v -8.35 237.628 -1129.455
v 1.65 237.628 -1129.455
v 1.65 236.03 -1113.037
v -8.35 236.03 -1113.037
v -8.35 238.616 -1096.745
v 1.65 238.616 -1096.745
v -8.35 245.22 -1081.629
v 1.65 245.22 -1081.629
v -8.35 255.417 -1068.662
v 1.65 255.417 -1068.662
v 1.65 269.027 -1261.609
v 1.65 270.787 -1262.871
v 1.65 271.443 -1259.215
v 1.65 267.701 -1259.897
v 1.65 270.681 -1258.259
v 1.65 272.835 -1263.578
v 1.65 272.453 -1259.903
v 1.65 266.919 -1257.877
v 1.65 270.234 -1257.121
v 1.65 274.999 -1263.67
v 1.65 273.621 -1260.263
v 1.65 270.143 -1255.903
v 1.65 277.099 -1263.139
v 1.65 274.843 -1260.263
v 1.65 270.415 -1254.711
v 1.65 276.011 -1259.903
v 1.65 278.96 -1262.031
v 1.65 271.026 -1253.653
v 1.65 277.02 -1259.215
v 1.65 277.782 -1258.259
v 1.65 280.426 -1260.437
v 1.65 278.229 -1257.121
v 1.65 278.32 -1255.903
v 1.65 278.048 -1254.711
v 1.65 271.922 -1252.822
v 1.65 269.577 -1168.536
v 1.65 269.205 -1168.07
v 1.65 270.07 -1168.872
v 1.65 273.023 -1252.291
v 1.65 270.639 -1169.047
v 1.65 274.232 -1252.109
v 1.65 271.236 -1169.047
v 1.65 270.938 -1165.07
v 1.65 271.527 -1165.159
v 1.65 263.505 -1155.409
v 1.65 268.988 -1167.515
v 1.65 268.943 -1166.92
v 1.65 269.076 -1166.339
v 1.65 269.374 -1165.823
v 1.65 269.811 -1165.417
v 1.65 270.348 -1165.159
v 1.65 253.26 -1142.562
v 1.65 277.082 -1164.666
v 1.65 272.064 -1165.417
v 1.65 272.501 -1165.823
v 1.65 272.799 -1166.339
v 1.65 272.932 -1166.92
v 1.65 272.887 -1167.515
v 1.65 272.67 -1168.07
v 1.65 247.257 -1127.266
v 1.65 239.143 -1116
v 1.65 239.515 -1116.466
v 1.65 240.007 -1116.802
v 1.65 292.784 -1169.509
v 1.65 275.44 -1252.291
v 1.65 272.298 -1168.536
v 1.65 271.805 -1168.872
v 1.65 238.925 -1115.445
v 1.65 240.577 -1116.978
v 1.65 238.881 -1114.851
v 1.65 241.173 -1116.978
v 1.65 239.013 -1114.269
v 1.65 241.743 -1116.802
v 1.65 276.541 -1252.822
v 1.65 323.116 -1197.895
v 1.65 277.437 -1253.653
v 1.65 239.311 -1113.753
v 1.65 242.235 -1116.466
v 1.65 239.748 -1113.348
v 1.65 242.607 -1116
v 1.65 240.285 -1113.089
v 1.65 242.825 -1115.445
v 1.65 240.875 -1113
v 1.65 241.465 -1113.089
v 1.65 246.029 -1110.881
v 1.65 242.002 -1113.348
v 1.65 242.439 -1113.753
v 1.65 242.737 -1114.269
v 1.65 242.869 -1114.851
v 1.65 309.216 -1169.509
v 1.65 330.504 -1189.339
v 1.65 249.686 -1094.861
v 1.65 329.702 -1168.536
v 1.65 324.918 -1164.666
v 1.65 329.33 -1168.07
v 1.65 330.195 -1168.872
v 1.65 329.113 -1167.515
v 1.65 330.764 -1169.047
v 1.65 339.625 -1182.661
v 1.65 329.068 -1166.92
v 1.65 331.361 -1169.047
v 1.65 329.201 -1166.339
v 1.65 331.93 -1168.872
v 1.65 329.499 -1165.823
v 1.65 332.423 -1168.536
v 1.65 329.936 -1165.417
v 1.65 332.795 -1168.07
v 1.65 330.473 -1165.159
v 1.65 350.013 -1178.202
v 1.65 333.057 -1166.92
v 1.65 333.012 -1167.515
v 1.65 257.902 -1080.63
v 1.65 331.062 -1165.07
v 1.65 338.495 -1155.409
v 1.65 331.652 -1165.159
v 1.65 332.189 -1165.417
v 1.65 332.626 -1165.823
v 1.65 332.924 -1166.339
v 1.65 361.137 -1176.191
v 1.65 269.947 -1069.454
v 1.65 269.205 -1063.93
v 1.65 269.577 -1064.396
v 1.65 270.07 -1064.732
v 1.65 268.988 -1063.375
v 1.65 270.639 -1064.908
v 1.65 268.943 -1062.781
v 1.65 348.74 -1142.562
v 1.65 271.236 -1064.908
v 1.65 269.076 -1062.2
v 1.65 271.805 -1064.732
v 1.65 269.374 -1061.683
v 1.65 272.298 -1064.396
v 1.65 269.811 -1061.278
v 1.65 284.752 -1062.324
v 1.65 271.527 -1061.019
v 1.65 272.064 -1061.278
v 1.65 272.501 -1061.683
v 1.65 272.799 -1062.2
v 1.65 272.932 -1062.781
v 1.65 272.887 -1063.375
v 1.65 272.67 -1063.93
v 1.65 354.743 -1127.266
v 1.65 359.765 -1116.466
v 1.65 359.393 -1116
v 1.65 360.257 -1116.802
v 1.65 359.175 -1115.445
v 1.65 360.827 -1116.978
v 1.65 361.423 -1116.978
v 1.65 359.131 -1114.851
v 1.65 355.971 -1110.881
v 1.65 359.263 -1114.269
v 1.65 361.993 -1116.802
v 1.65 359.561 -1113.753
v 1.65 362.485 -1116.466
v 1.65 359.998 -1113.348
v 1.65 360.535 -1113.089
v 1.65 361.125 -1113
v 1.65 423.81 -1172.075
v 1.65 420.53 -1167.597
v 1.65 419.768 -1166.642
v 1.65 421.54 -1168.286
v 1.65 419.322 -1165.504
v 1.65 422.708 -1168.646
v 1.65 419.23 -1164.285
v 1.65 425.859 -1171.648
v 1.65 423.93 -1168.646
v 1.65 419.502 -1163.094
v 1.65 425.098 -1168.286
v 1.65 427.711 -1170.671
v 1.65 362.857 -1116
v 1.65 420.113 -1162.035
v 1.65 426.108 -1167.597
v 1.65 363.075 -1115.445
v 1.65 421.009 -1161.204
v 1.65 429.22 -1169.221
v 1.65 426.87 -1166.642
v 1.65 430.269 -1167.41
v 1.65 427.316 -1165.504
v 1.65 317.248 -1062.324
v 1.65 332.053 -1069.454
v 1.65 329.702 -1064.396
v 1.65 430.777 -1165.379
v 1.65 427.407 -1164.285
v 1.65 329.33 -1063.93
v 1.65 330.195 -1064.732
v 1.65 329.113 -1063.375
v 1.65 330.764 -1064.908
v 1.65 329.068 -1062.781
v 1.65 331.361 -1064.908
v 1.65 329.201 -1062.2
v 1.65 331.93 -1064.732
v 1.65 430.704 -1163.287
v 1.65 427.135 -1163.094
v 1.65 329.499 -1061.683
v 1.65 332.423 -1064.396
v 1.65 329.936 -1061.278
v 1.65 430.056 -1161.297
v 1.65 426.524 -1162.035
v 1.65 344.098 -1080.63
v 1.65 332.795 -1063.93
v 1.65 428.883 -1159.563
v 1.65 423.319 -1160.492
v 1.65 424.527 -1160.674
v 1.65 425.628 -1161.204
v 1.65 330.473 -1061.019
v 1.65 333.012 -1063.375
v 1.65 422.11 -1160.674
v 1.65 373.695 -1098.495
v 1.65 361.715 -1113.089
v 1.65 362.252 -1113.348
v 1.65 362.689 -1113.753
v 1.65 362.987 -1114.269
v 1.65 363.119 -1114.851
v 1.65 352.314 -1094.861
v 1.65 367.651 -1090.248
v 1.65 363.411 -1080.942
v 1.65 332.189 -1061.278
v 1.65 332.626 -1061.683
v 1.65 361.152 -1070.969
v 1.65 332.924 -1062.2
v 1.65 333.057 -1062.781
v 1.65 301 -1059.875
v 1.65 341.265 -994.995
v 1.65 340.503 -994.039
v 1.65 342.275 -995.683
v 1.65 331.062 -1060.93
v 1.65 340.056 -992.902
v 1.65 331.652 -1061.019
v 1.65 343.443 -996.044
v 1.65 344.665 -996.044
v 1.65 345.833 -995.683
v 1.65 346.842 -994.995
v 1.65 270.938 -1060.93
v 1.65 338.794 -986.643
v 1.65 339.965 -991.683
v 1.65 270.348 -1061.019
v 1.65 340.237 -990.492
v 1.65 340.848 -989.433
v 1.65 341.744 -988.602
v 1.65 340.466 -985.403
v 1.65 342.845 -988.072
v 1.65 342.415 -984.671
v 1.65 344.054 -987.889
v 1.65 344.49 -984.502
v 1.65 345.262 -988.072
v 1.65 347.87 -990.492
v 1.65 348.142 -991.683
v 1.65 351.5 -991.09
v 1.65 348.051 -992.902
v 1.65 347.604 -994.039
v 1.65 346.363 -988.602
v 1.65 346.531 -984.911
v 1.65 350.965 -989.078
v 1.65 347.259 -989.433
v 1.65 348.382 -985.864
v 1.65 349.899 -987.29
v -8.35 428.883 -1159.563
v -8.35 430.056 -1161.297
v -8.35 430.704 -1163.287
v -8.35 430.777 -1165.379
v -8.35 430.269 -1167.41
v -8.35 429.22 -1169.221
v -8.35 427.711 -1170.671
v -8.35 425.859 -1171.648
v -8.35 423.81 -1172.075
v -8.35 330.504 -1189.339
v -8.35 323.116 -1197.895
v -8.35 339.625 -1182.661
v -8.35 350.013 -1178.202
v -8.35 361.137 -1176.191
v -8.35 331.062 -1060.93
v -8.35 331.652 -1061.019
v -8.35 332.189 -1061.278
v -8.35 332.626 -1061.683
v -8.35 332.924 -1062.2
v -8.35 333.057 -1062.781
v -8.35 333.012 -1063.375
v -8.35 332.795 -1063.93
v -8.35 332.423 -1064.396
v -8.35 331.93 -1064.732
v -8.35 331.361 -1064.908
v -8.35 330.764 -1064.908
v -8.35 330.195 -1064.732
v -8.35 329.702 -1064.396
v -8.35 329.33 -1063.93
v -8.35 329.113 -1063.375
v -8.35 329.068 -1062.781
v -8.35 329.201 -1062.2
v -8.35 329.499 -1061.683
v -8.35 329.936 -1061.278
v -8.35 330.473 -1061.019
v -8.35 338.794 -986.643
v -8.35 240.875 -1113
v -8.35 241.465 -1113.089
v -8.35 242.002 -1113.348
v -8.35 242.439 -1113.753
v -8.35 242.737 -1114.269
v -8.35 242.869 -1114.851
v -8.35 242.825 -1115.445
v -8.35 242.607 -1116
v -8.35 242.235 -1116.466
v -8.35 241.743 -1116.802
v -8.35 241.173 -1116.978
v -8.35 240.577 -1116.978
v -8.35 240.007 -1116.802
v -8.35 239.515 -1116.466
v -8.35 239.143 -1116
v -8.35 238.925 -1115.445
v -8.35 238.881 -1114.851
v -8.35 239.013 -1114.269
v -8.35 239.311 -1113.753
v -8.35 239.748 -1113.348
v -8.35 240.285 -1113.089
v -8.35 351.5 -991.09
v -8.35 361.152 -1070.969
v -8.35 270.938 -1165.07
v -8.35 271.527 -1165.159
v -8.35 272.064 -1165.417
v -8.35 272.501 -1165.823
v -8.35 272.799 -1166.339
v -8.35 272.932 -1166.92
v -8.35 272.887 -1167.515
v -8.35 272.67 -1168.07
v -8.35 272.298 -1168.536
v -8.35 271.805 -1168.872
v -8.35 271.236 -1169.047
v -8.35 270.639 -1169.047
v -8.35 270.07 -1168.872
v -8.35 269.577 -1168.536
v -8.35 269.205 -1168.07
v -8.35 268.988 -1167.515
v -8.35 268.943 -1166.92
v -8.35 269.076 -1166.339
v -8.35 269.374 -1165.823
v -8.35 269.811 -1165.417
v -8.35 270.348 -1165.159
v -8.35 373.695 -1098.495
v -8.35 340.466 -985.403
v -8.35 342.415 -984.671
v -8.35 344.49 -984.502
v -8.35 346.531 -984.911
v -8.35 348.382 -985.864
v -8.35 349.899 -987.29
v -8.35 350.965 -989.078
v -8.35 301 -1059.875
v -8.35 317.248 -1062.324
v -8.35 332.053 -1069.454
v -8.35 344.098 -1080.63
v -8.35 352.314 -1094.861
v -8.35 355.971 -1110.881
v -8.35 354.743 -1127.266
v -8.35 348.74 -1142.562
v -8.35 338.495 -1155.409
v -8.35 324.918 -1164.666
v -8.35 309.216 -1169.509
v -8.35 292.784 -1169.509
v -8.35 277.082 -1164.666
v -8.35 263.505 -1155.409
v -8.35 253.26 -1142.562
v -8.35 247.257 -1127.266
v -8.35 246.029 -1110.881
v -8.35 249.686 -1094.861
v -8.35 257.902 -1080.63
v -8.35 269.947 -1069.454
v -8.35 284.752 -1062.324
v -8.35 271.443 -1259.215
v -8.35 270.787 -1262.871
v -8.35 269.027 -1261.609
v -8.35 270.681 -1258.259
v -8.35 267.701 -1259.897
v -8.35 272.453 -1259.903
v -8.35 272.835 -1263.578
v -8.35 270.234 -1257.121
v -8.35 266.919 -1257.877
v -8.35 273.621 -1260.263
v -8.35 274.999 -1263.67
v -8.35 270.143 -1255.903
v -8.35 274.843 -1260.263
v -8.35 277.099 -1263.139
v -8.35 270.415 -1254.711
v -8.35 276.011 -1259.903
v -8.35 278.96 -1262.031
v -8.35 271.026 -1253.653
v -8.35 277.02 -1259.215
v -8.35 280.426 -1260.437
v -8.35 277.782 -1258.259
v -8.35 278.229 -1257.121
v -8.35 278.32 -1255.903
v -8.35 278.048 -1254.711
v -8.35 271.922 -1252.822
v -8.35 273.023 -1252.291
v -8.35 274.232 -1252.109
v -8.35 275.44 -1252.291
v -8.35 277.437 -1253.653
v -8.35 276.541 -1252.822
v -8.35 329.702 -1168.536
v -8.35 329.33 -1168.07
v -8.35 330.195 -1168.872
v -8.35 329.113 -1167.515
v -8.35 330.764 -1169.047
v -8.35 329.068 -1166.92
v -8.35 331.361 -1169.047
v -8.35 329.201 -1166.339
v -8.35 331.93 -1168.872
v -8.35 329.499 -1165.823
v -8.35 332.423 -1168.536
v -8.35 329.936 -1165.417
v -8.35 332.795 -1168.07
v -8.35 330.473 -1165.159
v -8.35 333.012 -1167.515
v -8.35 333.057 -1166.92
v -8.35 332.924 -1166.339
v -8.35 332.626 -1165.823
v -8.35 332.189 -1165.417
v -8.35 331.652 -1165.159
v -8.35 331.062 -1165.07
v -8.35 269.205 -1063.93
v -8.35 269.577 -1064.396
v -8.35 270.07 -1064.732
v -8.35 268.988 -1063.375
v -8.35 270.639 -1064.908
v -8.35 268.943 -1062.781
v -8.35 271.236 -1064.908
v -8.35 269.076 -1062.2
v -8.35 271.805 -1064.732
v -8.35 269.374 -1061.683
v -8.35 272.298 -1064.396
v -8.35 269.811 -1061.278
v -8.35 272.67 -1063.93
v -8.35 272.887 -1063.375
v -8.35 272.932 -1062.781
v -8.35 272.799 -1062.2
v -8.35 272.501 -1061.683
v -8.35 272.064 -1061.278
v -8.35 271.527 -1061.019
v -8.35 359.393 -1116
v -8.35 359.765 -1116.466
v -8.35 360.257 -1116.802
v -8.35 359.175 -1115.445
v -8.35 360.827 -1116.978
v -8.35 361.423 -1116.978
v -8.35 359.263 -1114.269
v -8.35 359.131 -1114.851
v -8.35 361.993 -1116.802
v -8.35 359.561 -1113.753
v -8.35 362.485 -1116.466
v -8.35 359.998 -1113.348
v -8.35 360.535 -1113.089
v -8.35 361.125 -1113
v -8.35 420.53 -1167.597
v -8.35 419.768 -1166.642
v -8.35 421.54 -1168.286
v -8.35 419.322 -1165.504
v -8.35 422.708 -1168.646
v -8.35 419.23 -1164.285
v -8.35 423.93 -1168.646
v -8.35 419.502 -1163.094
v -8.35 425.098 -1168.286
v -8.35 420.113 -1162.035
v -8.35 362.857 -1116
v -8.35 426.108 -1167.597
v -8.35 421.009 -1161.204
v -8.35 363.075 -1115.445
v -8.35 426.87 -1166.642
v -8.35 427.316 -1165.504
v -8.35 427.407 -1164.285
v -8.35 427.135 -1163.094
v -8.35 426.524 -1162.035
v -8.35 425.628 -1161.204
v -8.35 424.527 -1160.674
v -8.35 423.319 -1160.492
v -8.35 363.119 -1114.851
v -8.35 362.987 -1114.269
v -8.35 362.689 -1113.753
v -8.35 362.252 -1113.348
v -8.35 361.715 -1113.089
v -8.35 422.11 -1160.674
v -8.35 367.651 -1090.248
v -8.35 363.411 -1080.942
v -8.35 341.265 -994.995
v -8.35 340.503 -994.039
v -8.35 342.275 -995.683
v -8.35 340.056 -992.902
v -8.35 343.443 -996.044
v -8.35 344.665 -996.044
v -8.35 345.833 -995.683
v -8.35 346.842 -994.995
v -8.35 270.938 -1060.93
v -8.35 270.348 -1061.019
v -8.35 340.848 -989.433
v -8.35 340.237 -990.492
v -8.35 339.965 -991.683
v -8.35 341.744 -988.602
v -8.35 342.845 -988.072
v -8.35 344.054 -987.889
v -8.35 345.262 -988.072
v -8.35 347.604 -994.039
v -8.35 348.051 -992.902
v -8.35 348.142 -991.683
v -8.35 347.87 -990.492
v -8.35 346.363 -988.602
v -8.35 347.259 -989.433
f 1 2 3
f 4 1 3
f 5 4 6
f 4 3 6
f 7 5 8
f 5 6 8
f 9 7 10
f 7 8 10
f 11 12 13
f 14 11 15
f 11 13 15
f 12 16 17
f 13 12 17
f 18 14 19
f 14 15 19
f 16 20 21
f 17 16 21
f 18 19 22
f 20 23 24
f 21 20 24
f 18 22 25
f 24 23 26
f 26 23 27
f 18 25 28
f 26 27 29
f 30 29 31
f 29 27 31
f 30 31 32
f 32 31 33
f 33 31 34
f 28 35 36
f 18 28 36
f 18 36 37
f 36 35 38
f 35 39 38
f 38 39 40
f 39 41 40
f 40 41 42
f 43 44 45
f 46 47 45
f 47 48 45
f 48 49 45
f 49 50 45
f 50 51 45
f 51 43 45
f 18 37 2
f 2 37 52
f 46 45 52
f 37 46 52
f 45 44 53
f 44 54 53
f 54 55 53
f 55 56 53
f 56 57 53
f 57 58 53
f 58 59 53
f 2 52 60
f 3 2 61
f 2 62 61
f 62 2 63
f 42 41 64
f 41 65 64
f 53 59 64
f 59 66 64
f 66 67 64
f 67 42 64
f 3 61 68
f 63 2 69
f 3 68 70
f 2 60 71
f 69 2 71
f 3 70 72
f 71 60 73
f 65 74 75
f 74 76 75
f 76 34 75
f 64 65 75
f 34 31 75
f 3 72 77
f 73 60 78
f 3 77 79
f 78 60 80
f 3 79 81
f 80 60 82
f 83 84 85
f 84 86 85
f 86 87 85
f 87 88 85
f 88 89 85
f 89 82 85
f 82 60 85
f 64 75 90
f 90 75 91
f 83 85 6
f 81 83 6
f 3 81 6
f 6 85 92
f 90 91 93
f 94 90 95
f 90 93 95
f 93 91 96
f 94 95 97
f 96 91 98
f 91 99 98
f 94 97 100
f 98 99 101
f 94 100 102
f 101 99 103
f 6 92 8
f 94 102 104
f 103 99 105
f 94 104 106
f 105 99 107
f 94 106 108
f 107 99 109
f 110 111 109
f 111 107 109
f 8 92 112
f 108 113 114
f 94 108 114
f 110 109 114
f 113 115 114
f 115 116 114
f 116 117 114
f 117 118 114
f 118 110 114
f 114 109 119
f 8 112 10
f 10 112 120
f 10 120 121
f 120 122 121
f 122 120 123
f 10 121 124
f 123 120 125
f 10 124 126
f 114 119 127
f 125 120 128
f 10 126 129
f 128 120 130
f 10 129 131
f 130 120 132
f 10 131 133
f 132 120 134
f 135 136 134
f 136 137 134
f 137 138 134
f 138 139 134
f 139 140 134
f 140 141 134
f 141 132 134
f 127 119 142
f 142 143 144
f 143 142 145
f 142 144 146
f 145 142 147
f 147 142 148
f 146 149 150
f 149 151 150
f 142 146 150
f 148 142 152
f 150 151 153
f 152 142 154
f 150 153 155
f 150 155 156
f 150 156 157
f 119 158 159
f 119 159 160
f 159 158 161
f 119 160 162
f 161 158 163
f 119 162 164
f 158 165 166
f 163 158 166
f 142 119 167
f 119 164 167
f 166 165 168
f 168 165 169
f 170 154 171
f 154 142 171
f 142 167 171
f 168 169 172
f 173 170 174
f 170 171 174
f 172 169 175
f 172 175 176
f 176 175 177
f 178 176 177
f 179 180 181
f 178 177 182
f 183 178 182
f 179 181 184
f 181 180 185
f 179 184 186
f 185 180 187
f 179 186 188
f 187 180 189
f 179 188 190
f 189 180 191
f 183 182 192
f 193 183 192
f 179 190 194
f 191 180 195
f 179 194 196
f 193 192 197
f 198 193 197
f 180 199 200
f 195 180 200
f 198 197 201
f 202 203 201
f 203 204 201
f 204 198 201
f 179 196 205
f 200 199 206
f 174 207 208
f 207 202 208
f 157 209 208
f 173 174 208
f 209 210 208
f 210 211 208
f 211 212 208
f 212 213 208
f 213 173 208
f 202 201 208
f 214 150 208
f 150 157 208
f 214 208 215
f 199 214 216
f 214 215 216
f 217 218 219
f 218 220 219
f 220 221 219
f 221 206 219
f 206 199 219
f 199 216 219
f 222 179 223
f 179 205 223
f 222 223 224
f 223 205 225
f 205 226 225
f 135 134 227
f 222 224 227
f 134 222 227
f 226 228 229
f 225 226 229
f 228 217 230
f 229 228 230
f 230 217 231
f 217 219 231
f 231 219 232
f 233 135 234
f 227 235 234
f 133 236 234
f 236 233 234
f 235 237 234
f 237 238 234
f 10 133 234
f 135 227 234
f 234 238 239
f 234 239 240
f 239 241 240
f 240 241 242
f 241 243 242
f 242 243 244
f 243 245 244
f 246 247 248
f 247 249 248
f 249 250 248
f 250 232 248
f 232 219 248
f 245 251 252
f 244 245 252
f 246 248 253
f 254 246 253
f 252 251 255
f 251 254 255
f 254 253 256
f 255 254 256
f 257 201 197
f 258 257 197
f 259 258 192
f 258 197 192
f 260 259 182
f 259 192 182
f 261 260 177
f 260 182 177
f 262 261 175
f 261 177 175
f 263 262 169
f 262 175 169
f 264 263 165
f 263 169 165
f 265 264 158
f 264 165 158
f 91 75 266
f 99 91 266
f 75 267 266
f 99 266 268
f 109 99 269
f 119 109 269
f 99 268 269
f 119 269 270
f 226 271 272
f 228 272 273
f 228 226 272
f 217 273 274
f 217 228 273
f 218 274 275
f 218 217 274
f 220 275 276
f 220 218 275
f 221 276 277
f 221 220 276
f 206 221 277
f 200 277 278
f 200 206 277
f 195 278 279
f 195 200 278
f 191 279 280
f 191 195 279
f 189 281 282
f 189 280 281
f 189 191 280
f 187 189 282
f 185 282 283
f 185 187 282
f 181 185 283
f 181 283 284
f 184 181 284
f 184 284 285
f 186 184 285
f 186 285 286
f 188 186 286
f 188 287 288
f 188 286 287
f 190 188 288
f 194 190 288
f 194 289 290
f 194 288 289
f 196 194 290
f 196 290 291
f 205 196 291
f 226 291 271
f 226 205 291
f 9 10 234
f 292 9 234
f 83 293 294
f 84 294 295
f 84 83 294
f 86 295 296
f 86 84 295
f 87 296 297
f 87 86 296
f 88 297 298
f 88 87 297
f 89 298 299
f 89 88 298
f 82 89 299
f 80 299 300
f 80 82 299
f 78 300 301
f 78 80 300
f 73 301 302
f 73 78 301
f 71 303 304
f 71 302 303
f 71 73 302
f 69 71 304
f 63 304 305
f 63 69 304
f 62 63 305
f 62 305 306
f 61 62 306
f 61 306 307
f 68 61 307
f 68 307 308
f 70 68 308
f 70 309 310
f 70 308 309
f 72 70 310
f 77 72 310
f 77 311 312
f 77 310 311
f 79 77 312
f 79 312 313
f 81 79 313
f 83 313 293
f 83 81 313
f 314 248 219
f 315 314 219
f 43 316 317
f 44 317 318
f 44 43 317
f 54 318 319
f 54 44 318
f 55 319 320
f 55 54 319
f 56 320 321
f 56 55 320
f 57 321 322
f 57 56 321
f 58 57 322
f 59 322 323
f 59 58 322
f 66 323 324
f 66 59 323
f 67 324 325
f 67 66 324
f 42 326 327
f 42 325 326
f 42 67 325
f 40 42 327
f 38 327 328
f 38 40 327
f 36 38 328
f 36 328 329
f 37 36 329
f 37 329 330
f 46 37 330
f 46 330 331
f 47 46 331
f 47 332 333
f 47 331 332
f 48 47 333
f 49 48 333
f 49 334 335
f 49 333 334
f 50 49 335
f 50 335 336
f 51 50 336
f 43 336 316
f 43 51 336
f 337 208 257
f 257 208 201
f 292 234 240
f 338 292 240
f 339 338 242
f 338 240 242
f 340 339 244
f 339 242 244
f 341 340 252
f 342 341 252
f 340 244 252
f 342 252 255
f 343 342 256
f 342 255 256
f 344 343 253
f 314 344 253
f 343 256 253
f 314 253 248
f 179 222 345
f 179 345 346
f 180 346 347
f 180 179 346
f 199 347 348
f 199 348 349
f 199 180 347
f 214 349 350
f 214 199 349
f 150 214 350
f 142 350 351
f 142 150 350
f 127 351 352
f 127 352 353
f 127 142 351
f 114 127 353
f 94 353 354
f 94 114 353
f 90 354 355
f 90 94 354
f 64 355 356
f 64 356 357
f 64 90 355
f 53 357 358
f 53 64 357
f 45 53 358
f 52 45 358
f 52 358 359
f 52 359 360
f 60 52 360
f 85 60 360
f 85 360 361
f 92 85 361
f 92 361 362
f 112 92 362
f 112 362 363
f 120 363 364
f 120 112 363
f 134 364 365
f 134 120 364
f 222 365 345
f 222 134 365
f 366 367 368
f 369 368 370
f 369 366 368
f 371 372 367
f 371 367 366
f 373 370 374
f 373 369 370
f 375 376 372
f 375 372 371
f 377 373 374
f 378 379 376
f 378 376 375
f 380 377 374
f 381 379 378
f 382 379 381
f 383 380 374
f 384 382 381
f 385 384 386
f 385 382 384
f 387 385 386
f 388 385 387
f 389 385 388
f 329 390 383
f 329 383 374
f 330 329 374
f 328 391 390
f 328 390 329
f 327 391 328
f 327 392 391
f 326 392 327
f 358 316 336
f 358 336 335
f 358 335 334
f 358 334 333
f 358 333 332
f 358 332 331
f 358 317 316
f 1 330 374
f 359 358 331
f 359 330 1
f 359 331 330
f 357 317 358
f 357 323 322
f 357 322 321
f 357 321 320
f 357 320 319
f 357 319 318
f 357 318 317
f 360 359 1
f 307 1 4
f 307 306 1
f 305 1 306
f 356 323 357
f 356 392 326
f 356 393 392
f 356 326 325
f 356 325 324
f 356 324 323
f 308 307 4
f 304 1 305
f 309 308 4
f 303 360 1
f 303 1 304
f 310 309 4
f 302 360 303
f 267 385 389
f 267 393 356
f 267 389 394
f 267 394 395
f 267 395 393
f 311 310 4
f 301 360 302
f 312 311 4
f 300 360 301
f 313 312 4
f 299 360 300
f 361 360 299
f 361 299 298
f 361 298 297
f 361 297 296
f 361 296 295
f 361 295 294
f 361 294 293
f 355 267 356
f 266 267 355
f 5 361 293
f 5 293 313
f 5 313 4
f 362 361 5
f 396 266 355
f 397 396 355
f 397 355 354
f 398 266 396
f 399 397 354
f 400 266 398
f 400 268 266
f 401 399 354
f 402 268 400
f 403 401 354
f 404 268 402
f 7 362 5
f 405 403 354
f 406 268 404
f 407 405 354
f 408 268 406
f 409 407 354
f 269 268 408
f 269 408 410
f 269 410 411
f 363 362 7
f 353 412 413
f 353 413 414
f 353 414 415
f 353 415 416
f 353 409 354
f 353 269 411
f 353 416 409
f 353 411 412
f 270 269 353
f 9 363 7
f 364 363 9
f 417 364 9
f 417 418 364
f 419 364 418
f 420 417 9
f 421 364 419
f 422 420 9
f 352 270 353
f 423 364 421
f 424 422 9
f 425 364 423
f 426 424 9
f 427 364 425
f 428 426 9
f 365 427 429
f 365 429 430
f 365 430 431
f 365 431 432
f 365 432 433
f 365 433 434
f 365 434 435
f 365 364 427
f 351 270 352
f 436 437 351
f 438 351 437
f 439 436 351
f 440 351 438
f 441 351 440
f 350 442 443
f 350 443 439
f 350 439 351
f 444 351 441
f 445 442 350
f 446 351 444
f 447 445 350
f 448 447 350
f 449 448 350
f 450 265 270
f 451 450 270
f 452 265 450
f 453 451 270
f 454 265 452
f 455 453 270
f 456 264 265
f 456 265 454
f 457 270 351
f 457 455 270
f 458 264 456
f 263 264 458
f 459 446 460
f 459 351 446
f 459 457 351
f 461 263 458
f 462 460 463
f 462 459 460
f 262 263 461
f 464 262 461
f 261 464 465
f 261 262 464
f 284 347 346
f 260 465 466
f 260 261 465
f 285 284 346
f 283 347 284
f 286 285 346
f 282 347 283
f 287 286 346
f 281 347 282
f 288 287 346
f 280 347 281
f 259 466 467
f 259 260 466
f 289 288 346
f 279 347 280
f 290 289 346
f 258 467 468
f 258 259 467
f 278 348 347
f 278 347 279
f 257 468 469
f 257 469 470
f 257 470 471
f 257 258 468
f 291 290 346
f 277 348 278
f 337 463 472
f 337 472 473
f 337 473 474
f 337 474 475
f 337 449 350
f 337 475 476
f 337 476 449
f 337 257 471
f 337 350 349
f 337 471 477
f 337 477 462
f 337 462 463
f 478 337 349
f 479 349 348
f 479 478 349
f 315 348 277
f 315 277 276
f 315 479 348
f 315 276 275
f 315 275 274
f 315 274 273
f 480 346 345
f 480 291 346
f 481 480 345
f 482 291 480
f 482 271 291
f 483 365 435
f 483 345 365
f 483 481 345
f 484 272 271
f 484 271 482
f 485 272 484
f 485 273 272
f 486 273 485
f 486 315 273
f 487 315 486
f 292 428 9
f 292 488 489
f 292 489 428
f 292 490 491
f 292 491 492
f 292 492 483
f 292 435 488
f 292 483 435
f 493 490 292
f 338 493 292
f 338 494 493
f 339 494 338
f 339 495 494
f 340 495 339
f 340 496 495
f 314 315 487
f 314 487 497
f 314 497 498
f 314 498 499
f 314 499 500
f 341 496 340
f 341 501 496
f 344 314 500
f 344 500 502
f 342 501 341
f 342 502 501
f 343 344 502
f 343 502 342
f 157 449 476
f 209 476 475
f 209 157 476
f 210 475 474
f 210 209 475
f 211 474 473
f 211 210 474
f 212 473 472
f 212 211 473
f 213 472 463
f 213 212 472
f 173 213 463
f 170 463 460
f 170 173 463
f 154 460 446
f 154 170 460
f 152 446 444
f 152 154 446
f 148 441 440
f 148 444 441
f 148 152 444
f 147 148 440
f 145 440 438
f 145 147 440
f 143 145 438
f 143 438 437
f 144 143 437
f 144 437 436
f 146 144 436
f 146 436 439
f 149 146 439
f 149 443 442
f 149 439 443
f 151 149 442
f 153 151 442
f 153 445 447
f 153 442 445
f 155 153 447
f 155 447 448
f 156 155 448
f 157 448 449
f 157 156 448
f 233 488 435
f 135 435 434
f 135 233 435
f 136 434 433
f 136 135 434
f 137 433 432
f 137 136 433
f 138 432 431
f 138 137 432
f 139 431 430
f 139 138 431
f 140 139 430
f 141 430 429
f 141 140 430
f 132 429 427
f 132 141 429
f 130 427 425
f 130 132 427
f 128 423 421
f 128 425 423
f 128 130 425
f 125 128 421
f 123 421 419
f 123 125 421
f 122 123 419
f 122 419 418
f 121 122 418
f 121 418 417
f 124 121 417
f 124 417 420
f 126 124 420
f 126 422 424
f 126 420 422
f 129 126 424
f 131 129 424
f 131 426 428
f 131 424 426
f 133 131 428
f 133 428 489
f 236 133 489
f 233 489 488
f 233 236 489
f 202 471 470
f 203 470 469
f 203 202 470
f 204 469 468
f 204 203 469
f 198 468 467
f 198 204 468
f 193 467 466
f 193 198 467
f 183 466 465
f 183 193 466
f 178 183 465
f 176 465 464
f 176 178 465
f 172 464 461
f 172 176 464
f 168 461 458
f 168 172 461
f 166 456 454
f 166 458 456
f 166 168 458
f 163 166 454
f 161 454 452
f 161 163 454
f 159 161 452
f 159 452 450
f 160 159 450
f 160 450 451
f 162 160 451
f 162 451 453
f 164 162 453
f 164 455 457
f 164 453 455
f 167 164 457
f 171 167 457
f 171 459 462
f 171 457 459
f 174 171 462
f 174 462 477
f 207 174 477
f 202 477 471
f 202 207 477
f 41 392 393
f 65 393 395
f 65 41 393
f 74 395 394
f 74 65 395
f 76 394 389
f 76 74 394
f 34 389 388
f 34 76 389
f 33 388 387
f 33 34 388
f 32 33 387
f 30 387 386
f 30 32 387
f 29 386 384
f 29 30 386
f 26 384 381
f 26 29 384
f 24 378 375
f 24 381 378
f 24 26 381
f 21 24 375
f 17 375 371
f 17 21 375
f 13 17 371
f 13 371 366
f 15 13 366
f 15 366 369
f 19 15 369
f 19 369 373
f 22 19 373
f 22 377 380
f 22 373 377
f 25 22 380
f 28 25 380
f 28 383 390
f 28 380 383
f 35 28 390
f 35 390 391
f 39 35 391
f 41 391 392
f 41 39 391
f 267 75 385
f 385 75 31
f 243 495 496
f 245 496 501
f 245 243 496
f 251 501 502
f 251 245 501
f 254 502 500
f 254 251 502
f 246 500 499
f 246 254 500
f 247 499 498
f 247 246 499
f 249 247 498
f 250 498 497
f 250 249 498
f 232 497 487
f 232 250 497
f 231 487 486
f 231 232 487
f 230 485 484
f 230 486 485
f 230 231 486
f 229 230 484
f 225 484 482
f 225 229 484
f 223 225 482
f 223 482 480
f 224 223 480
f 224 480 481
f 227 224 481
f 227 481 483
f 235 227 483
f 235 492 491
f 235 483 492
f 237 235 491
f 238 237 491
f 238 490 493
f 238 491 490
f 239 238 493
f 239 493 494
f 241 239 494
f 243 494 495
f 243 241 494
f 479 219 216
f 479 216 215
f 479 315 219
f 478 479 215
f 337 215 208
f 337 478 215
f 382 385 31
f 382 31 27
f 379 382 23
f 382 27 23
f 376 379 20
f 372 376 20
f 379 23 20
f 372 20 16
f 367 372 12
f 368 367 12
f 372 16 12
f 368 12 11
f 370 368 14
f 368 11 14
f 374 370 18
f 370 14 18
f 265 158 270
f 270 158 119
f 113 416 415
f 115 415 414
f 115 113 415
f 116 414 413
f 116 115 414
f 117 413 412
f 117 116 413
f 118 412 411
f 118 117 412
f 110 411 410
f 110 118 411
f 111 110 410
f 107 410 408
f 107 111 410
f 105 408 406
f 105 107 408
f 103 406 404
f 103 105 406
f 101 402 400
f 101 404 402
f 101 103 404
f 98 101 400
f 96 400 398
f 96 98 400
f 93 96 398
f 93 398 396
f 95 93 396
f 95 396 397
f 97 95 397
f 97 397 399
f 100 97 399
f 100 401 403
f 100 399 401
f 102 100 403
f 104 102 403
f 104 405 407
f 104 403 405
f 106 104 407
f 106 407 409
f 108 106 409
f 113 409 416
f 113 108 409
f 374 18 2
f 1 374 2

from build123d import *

# Parameters (mm, degrees)
BOSS_EXTRUDE1_OUTLINE_R = 55.125
BOSS_EXTRUDE1_DEPTH     = 10
FILLET1_R               = 50
SKETCH4_R               = 2
CUT_EXTRUDE1_DEPTH      = 1336.164989569
SKETCH5_R               = 4.1
CUT_EXTRUDE2_DEPTH      = 1336.164989569


# Read off the part's stored shape, not the designer's step: Boss-Extrude1
with BuildPart() as part:
    # Boss-Extrude1 outline → Boss-Extrude1 (new body)
    with BuildSketch(Plane.ZY.offset(-1.65)):
        with BuildLine():
            Line((-1257.876937074, 266.919395505), (-1129.454602927, 237.627573392))
            ThreePointArc((-1129.454602927, 237.627573392), (-1096.744938567, 238.616085951), (-1068.662335154, 255.416880135))
            Line((-1068.662335154, 255.416880135), (-986.642796778, 338.794101601))
            ThreePointArc((-986.642796778, 338.794101601), (-984.910512742, 346.53132054), (-991.089695369, 351.499526147))
            Line((-991.089695369, 351.499526147), (-1086.722744118, 363.055830047))
            Line((-1086.722744118, 363.055830047), (-1159.562924749, 428.883221767))
            ThreePointArc((-1159.562924749, 428.883221767), (-1167.409525964, 430.269317516), (-1172.0754788, 423.810269894))
            Line((-1172.0754788, 423.810269894), (-1177.78637409, 336.842019695))
            Line((-1177.78637409, 336.842019695), (-1260.437346066, 280.42610587))
            ThreePointArc((-1260.437346066, 280.42610587), (-1263.57786788, 272.834732614), (-1257.876937074, 266.919395505))
        make_face()
        with Locations((-1115, 301)):
            Circle(BOSS_EXTRUDE1_OUTLINE_R, mode=Mode.SUBTRACT)
    extrude(amount=BOSS_EXTRUDE1_DEPTH)

    # Fillet1
    fillet1_edges = [part.edges().sort_by_distance(p)[0] for p in [
        (-3.35, 336.842019695, -1177.78637409),
        (-3.35, 363.055830047, -1086.722744118),
    ]]
    fillet(fillet1_edges, radius=FILLET1_R)

    # Sketch4 → Cut-Extrude1 (cut, through all)
    with BuildSketch(Plane.ZY.offset(-1.65)):
        with Locations((-1062.930222597, 331.0625)):
            Circle(SKETCH4_R)
        with Locations((-1115, 361.125)):
            Circle(SKETCH4_R)
        with Locations((-1062.930222597, 270.9375)):
            Circle(SKETCH4_R)
        with Locations((-1115, 240.875)):
            Circle(SKETCH4_R)
        with Locations((-1167.069777403, 270.9375)):
            Circle(SKETCH4_R)
        with Locations((-1167.069777403, 331.0625)):
            Circle(SKETCH4_R)
    extrude(amount=CUT_EXTRUDE1_DEPTH, mode=Mode.SUBTRACT)

    # Sketch5 → Cut-Extrude2 (cut, through all)
    with BuildSketch(Plane.ZY.offset(-1.65)):
        with Locations((-1164.591596996, 423.318830027)):
            Circle(SKETCH5_R)
        with Locations((-991.989450415, 344.053692355)):
            Circle(SKETCH5_R)
        with Locations((-1256.209098275, 274.231598575)):
            Circle(SKETCH5_R)
    extrude(amount=CUT_EXTRUDE2_DEPTH, mode=Mode.SUBTRACT)


solid = part.part
